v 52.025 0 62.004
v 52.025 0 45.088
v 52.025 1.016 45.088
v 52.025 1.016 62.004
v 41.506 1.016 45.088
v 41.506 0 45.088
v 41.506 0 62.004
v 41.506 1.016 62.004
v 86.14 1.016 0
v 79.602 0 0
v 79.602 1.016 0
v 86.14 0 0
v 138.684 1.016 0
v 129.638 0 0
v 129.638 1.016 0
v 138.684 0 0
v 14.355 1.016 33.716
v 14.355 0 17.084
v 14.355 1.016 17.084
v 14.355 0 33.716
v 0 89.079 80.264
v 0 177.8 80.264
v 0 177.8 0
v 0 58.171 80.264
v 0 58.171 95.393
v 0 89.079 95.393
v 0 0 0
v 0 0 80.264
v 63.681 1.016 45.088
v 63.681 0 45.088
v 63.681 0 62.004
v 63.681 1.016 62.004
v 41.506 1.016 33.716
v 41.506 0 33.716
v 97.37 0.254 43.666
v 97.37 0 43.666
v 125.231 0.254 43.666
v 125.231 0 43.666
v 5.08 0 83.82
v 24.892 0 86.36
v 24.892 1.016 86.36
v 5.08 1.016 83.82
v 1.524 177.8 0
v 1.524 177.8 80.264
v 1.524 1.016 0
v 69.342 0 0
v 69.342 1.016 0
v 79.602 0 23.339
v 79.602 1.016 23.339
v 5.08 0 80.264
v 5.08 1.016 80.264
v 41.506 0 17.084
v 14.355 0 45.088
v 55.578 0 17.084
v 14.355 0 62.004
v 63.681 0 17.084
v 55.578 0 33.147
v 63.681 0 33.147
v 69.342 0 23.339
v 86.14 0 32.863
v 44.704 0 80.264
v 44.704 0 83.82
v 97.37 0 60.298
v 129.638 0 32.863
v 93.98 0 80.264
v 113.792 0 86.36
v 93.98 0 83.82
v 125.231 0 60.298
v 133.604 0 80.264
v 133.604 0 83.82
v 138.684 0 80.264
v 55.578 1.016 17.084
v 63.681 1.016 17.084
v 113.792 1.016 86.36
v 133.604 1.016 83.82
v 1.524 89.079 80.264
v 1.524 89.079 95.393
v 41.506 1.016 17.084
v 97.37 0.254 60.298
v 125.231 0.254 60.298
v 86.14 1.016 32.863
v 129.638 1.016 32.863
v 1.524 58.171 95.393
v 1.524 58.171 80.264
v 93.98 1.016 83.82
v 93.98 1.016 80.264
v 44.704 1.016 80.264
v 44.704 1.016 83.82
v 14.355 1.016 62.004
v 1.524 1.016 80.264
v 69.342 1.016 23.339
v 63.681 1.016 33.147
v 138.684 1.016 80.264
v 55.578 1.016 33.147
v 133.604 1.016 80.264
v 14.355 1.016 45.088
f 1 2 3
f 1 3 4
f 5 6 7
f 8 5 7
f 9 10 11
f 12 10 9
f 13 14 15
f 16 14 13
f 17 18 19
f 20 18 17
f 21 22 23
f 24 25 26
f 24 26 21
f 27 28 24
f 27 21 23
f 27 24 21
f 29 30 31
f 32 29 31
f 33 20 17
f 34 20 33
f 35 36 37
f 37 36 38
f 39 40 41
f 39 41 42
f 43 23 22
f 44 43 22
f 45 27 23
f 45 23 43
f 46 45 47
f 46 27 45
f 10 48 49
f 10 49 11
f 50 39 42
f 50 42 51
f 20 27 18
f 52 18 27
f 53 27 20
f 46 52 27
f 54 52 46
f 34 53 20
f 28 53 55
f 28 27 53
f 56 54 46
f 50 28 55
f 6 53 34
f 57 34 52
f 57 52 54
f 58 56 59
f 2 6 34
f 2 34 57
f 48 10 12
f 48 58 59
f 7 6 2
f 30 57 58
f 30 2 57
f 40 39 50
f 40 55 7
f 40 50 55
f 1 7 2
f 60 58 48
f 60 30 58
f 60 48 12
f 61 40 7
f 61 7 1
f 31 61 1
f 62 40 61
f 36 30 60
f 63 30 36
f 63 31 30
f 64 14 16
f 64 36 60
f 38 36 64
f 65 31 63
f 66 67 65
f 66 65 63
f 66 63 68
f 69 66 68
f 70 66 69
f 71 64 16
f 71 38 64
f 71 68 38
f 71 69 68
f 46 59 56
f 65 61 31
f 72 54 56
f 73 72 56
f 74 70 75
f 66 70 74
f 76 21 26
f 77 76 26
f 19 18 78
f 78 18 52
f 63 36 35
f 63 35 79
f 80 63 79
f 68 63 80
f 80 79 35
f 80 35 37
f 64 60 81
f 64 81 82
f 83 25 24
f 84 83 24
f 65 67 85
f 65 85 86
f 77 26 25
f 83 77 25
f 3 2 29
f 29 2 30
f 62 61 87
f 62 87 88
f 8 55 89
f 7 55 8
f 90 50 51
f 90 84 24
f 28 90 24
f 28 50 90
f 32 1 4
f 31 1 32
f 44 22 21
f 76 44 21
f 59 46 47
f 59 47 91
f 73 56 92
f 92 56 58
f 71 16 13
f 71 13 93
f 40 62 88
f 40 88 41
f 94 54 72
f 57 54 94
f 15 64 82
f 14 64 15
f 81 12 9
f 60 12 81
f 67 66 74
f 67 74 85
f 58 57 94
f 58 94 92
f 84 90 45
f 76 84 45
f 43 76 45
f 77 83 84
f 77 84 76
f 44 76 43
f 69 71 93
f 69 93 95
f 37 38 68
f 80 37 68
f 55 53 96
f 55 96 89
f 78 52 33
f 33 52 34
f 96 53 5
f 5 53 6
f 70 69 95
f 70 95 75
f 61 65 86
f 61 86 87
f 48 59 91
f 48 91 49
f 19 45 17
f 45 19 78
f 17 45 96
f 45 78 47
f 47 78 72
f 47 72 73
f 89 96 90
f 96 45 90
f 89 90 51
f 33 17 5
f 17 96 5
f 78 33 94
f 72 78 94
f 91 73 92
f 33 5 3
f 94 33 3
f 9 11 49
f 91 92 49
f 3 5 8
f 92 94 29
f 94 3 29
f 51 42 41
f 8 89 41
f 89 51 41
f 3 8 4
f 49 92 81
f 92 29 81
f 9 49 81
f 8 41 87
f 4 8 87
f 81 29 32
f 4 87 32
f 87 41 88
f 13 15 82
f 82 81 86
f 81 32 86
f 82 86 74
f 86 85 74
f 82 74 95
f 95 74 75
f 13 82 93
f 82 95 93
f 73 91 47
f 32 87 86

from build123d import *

# Parameters (mm, degrees)
F0_W     = 2715.0481939316
F0_H     = 1663.144826889
F0_W_2   = 810.2502822876
F0_H_2   = 1606.2853336334
F0_H_3   = 1691.5745735168
F0_W_3   = 1165.6231880188
F0_W_4   = 2786.1232757568
F0_H_4   = 1663.1445884705
F1_DEPTH = 101.6
F2_DEPTH = 25.4
F4_DEPTH = 152.4
F5_SCALE = 0.01


with BuildPart() as f1:
    # F0 (on Front) → F1 (new body)
    with BuildSketch(Plane.XZ):
        Polygon((0, 8026.4), (0, 0), (6934.2, 0), (6934.2, 2333.8942527771), (7960.1616859436, 2333.8942527771), (7960.1616859436, 0), (8614.0480041504, 0), (8614.0480041504, 3286.2932682037), (12963.8109207153, 3286.2932682037), (12963.8109207153, 0), (13868.4, 0), (13868.4, 8026.4), (13360.4, 8026.4), (13360.4, 8382), (11379.2, 8636), (9398, 8382), (9398, 8026.4), (4470.4, 8026.4), (4470.4, 8382), (2489.2, 8636), (508, 8382), (508, 8026.4), align=None)
        with Locations((2793.0410504341, 2540.0103330612)):
            Rectangle(F0_W, F0_H, mode=Mode.SUBTRACT)
        with Locations((5962.9664421082, 2511.5805864334)):
            Rectangle(F0_W_2, F0_H_2, mode=Mode.SUBTRACT)
        with Locations((2793.0410504341, 5354.562997818)):
            Rectangle(F0_W, F0_H_3, mode=Mode.SUBTRACT)
        with Locations((5785.2799892426, 5354.562997818)):
            Rectangle(F0_W_3, F0_H_3, mode=Mode.SUBTRACT)
        with Locations((11130.0868988037, 5198.1990337372)):
            Rectangle(F0_W_4, F0_H_4, mode=Mode.SUBTRACT)
        with Locations((11130.0868988037, 5198.1990337372)):
            Rectangle(F0_W_4, F0_H_4)
    extrude(amount=-F1_DEPTH)

    # F0 (on Front) → F2 (cut)
    with BuildSketch(Plane.XZ):
        with Locations((11130.0868988037, 5198.1990337372)):
            Rectangle(F0_W_4, F0_H_4)
    extrude(amount=-F2_DEPTH, mode=Mode.SUBTRACT)

    # F3 (on Right) → F4 (join)
    with BuildSketch(Plane.YZ):
        Polygon((0, 8026.4), (0, 0), (17780, 0), (17780, 8026.4), (8907.9284667969, 8026.4), (8907.9284667969, 9539.3447875977), (5817.1215057373, 9539.3447875977), (5817.1215057373, 8026.4), align=None)
    extrude(amount=F4_DEPTH)


with BuildPart() as f1_1:
    # F5: moved
    add(f1.part.scale(F5_SCALE))


solid = f1_1.part
